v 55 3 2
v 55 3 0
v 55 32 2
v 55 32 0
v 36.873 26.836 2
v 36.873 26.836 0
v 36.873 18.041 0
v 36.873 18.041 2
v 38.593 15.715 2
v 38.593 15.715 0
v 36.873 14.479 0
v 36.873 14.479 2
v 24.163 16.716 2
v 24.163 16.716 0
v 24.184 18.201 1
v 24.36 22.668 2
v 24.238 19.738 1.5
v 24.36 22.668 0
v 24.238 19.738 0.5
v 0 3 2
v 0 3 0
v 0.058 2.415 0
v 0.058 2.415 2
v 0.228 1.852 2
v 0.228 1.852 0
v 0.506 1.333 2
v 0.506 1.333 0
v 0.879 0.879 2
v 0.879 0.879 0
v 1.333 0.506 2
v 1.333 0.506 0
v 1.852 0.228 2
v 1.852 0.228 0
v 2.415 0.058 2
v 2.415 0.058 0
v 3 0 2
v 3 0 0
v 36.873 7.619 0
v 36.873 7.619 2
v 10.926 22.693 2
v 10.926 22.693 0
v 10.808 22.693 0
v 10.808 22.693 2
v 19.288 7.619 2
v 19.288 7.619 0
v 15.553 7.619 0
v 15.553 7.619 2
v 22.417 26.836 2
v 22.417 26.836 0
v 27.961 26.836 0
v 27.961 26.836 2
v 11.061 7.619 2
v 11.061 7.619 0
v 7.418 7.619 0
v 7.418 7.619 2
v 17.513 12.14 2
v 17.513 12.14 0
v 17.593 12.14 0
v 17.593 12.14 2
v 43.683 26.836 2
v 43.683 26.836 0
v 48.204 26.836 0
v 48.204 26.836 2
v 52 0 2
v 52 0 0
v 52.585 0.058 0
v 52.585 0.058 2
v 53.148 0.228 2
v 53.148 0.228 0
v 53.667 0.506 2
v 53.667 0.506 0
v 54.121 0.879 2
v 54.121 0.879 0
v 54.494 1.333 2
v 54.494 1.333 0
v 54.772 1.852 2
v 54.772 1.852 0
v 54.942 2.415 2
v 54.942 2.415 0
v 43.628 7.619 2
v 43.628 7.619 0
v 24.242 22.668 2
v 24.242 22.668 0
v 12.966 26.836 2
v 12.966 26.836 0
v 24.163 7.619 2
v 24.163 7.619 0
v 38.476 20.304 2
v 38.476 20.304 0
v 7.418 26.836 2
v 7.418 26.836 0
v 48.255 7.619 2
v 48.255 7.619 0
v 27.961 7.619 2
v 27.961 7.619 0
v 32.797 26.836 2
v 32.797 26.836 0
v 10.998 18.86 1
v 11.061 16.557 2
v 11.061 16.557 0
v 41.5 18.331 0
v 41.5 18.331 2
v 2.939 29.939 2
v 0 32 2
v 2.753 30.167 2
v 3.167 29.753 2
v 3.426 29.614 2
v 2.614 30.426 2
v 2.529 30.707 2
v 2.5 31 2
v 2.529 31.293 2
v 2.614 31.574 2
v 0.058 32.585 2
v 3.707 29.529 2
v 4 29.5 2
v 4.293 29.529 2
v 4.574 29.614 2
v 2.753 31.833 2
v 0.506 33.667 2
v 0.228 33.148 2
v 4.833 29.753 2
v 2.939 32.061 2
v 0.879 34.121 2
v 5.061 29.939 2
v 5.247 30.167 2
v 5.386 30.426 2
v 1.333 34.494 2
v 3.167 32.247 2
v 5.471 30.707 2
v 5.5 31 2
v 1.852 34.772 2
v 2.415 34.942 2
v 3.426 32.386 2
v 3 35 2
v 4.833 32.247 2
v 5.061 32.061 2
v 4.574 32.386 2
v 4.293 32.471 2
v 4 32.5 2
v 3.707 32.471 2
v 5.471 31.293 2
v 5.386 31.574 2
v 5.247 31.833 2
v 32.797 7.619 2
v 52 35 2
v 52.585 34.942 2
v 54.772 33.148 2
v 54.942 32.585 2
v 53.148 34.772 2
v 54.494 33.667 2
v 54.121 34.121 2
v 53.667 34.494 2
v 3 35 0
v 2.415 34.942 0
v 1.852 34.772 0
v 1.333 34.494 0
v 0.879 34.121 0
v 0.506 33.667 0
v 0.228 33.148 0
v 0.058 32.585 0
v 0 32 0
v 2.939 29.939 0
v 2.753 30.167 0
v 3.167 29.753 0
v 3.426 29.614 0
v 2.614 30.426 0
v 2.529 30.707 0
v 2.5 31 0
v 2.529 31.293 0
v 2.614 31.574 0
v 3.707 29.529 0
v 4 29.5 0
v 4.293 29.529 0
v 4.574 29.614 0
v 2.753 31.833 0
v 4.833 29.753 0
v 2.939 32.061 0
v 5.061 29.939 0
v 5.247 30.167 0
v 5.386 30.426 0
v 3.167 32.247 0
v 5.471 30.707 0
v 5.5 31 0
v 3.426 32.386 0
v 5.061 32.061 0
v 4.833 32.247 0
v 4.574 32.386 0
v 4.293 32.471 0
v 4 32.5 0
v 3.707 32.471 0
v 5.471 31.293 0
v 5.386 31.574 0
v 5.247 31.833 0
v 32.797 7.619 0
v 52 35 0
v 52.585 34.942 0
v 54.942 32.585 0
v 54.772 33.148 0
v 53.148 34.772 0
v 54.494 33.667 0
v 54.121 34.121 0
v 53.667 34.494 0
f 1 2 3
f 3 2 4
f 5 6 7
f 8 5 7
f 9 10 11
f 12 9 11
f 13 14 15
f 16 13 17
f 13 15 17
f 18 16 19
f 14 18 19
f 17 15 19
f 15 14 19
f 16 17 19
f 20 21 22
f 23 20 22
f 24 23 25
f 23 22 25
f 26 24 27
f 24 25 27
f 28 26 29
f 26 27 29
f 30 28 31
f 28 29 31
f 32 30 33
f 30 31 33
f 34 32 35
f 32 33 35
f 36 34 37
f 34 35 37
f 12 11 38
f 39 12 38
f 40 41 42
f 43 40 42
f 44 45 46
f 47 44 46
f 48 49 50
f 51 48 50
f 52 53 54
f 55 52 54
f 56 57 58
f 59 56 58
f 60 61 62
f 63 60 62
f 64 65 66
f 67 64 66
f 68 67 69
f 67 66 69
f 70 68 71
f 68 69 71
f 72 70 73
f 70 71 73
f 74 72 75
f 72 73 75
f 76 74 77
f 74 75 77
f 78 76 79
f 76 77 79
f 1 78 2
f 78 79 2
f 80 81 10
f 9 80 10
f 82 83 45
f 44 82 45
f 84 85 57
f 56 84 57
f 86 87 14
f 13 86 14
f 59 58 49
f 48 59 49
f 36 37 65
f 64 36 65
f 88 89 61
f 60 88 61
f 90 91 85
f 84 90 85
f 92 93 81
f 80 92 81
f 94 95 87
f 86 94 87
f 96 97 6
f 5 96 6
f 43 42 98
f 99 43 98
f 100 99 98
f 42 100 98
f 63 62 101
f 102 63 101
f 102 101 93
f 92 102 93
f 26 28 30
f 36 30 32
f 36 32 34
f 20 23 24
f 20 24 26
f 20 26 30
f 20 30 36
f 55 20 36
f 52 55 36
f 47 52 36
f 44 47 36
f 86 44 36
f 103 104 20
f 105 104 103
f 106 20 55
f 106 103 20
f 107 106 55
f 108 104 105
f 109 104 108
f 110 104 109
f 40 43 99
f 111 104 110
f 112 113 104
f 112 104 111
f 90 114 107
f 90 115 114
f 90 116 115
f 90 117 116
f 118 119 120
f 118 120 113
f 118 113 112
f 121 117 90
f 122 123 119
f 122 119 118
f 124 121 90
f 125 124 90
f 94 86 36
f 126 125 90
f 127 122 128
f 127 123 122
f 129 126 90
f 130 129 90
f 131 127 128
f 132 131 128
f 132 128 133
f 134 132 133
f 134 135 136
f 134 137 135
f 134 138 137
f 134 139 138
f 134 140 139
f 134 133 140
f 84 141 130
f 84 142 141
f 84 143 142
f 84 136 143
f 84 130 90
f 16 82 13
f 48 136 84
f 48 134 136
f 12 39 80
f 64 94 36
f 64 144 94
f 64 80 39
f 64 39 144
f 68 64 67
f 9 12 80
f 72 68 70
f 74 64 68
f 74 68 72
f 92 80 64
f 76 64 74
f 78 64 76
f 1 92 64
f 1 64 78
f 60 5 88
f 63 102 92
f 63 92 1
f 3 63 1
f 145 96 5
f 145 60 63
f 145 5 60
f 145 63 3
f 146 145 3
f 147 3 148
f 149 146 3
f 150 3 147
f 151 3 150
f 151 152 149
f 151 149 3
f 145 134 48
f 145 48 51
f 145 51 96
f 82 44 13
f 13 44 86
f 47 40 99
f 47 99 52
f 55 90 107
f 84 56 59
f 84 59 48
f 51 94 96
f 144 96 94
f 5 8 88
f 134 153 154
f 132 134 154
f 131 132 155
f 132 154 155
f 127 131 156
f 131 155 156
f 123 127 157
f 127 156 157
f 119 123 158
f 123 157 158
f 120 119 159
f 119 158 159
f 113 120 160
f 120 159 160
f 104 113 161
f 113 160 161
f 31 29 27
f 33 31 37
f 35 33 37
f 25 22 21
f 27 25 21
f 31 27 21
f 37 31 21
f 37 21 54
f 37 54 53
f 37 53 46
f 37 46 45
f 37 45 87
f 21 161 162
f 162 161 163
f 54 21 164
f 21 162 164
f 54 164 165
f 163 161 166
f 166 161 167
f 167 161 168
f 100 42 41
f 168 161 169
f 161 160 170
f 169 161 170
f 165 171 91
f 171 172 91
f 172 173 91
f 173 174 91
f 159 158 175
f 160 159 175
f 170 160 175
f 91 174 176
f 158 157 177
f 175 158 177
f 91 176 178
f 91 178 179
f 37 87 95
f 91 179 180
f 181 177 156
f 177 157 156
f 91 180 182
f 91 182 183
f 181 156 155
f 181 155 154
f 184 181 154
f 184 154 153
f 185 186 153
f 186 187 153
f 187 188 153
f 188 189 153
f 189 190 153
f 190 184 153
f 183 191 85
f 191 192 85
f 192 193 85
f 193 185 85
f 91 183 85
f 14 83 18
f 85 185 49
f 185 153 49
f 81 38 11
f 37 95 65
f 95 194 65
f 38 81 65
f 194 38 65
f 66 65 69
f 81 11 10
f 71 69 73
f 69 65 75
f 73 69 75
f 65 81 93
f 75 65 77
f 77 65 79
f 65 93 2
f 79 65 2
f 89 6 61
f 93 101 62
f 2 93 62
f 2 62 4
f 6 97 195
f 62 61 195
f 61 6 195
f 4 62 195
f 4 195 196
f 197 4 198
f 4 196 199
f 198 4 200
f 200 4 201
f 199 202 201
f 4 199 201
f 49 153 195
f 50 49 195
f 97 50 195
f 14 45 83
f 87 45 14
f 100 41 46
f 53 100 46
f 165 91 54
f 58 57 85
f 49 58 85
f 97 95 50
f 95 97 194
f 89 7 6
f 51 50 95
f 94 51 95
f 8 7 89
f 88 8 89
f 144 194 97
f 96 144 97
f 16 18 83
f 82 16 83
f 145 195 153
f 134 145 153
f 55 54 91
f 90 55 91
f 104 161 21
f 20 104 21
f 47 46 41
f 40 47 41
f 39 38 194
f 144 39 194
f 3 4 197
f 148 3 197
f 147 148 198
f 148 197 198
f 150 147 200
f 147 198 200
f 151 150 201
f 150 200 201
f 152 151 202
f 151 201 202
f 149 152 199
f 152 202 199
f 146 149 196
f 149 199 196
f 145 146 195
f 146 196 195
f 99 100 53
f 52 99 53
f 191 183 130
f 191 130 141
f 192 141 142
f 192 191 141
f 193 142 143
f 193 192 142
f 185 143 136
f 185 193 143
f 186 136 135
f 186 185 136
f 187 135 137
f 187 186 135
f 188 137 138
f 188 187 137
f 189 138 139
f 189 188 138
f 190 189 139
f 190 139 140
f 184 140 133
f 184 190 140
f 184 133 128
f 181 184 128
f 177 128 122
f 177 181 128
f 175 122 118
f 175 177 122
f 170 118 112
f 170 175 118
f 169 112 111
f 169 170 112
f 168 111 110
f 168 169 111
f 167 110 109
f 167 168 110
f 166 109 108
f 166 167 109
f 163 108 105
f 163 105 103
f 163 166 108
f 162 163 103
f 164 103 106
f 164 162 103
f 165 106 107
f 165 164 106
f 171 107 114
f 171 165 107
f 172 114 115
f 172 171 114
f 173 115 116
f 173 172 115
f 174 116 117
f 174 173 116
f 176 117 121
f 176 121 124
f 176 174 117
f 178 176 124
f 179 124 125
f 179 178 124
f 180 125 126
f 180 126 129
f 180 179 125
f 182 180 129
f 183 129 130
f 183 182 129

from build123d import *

# Parameters (mm, degrees)
F0_R     = 1.5
F1_DEPTH = 2


with BuildPart() as f1:
    # F0 (on Top) → F1 (new body)
    with BuildSketch(Plane.XY):
        with BuildLine():
            ThreePointArc((0, 3), (0.8786796564, 0.8786796564), (3, 0))
            Line((3, 0), (52, 0))
            ThreePointArc((52, 0), (54.1213203436, 0.8786796564), (55, 3))
            Line((55, 3), (55, 32))
            ThreePointArc((55, 32), (54.1213203436, 34.1213203436), (52, 35))
            Line((52, 35), (3, 35))
            ThreePointArc((3, 35), (0.8786796564, 34.1213203436), (0, 32))
            Line((0, 32), (0, 3))
        make_face()
        with BuildLine():
            Line((19.287783905, 7.6187494158), (15.552855407, 7.6187494158))
            Line((15.552855407, 7.6187494158), (10.9262547902, 22.6930554257))
            Line((10.9262547902, 22.6930554257), (10.8084867745, 22.6930554257))
            add(Edge.make_bspline(
                [(10.8084867745, 22.6930554257), (11.0608468081, 18.0958968128), (11.0608468081, 16.5565006075)],
                knots=[0, 0, 0, 1, 1, 1], degree=2))
            Line((11.0608468081, 16.5565006075), (11.0608468081, 7.6187494158))
            Line((11.0608468081, 7.6187494158), (7.4184503225, 7.6187494158))
            Line((7.4184503225, 7.6187494158), (7.4184503225, 26.8359659781))
            Line((7.4184503225, 26.8359659781), (12.9661650622, 26.8359659781))
            Line((12.9661650622, 26.8359659781), (17.5128516684, 12.1402000187))
            Line((17.5128516684, 12.1402000187), (17.592765679, 12.1402000187))
            Line((17.592765679, 12.1402000187), (22.4170483223, 26.8359659781))
            Line((22.4170483223, 26.8359659781), (27.9605570614, 26.8359659781))
            Line((27.9605570614, 26.8359659781), (27.9605570614, 7.6187494158))
            Line((27.9605570614, 7.6187494158), (24.162538555, 7.6187494158))
            Line((24.162538555, 7.6187494158), (24.162538555, 16.7163286288))
            add(Edge.make_bspline(
                [(24.162538555, 16.7163286288), (24.162538555, 17.3598467146), (24.1835685578, 18.2010468268)],
                knots=[0, 0, 0, 1, 1, 1], degree=2))
            add(Edge.make_bspline(
                [(24.1835685578, 18.2010468268), (24.2045985606, 19.042246939), (24.3602205814, 22.6678194224)],
                knots=[0, 0, 0, 1, 1, 1], degree=2))
            Line((24.3602205814, 22.6678194224), (24.2424525657, 22.6678194224))
            Line((24.2424525657, 22.6678194224), (19.287783905, 7.6187494158))
        make_face(mode=Mode.SUBTRACT)
        Polygon((41.4996728666, 18.3314328442), (48.2545097673, 7.6187494158), (43.6279091504, 7.6187494158), (38.5933264791, 15.7153004954), (36.8730722497, 14.4787363305), (36.8730722497, 7.6187494158), (32.7974577063, 7.6187494158), (32.7974577063, 26.8359659781), (36.8730722497, 26.8359659781), (36.8730722497, 18.0412188055), (38.4755584634, 20.3040471072), (43.6825871577, 26.8359659781), (48.2040377605, 26.8359659781), align=None, mode=Mode.SUBTRACT)
        with Locations((4, 31)):
            Circle(F0_R, mode=Mode.SUBTRACT)
    extrude(amount=F1_DEPTH)


solid = f1.part
